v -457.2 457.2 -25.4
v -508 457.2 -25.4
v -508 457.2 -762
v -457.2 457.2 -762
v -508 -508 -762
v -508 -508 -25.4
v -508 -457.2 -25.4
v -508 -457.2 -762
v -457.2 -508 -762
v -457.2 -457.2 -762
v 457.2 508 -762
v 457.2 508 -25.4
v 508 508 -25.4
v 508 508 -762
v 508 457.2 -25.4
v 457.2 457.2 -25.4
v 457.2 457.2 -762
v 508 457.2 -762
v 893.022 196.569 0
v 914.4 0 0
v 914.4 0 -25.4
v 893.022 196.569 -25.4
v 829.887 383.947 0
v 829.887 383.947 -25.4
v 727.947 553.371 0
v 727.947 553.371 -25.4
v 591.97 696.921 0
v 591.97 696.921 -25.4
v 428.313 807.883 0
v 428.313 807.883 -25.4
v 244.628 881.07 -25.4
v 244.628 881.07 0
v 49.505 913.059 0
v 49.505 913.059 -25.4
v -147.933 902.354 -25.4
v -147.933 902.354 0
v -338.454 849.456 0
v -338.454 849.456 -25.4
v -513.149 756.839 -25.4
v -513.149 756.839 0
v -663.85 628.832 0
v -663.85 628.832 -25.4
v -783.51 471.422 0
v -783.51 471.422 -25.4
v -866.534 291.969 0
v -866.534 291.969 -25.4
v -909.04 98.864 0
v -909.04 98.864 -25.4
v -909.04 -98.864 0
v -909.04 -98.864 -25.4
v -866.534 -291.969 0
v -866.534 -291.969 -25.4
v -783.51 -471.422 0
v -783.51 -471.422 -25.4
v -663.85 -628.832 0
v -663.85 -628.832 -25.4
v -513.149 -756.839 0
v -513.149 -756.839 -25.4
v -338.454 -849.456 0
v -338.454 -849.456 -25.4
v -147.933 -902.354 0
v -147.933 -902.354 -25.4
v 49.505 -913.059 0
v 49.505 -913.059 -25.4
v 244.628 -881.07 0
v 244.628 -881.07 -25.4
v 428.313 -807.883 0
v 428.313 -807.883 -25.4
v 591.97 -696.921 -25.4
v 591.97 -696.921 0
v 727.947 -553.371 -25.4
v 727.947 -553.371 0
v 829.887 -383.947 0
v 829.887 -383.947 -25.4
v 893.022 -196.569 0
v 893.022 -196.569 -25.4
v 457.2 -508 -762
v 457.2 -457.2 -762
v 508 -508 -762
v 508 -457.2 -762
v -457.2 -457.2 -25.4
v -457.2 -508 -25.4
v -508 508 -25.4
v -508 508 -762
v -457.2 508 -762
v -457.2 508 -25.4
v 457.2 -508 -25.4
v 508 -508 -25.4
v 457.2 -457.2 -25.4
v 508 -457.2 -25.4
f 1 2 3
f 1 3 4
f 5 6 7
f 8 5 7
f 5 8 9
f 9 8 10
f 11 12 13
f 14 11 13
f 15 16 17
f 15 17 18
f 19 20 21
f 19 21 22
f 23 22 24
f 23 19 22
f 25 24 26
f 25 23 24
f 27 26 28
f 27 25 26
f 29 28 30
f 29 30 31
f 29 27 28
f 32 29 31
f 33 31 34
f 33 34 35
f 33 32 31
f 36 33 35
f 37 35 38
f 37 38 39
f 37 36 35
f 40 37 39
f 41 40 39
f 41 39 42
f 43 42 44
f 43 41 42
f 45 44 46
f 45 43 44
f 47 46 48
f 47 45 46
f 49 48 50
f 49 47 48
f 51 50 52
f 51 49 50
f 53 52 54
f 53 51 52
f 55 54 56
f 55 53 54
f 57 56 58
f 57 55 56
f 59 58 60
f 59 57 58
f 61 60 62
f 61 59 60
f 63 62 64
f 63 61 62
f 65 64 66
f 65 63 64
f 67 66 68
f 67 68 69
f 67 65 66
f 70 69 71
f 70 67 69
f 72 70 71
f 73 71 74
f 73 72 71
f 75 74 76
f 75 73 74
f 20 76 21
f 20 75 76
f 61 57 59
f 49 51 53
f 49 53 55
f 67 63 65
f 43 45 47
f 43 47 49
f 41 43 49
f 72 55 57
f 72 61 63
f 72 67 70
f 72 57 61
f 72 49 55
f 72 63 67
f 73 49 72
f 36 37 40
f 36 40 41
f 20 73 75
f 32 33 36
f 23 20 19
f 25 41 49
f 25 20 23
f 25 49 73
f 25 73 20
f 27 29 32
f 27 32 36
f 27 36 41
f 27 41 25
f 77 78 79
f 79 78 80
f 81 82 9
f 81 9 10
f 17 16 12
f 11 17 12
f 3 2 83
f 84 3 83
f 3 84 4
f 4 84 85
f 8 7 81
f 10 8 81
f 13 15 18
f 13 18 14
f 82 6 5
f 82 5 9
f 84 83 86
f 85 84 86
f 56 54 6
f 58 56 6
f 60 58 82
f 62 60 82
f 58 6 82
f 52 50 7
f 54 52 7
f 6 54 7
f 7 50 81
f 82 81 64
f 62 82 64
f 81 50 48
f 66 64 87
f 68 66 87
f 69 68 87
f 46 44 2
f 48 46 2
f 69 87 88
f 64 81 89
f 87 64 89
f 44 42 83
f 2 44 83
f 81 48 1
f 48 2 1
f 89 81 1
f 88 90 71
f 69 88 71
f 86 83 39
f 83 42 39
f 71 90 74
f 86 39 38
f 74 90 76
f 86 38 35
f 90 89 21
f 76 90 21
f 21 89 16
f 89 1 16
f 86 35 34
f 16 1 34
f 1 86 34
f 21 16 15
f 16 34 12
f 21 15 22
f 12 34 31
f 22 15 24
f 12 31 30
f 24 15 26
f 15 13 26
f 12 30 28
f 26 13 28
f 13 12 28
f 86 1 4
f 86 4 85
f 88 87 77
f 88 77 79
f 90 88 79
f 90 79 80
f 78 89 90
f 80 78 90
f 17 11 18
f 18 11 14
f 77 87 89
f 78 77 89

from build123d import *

# Parameters (mm, degrees)
F0_R     = 914.4
F1_DEPTH = 25.4
F2_W     = 50.8
F2_H     = 50.8
F3_DEPTH = 762


with BuildPart() as f1:
    # F0 (on Top) → F1 (new body)
    with BuildSketch(Plane.XY):
        Circle(F0_R)
    extrude(amount=-F1_DEPTH)

    # F2 (on Top) → F3 (join)
    with BuildSketch(Plane.XY):
        with Locations((482.6, -482.6)):
            Rectangle(F2_W, F2_H)
        with Locations((482.6, 482.6)):
            Rectangle(F2_W, F2_H)
        with Locations((-482.6, 482.6)):
            Rectangle(F2_W, F2_H)
        with Locations((-482.6, -482.6)):
            Rectangle(F2_W, F2_H)
    extrude(amount=-F3_DEPTH)


solid = f1.part
